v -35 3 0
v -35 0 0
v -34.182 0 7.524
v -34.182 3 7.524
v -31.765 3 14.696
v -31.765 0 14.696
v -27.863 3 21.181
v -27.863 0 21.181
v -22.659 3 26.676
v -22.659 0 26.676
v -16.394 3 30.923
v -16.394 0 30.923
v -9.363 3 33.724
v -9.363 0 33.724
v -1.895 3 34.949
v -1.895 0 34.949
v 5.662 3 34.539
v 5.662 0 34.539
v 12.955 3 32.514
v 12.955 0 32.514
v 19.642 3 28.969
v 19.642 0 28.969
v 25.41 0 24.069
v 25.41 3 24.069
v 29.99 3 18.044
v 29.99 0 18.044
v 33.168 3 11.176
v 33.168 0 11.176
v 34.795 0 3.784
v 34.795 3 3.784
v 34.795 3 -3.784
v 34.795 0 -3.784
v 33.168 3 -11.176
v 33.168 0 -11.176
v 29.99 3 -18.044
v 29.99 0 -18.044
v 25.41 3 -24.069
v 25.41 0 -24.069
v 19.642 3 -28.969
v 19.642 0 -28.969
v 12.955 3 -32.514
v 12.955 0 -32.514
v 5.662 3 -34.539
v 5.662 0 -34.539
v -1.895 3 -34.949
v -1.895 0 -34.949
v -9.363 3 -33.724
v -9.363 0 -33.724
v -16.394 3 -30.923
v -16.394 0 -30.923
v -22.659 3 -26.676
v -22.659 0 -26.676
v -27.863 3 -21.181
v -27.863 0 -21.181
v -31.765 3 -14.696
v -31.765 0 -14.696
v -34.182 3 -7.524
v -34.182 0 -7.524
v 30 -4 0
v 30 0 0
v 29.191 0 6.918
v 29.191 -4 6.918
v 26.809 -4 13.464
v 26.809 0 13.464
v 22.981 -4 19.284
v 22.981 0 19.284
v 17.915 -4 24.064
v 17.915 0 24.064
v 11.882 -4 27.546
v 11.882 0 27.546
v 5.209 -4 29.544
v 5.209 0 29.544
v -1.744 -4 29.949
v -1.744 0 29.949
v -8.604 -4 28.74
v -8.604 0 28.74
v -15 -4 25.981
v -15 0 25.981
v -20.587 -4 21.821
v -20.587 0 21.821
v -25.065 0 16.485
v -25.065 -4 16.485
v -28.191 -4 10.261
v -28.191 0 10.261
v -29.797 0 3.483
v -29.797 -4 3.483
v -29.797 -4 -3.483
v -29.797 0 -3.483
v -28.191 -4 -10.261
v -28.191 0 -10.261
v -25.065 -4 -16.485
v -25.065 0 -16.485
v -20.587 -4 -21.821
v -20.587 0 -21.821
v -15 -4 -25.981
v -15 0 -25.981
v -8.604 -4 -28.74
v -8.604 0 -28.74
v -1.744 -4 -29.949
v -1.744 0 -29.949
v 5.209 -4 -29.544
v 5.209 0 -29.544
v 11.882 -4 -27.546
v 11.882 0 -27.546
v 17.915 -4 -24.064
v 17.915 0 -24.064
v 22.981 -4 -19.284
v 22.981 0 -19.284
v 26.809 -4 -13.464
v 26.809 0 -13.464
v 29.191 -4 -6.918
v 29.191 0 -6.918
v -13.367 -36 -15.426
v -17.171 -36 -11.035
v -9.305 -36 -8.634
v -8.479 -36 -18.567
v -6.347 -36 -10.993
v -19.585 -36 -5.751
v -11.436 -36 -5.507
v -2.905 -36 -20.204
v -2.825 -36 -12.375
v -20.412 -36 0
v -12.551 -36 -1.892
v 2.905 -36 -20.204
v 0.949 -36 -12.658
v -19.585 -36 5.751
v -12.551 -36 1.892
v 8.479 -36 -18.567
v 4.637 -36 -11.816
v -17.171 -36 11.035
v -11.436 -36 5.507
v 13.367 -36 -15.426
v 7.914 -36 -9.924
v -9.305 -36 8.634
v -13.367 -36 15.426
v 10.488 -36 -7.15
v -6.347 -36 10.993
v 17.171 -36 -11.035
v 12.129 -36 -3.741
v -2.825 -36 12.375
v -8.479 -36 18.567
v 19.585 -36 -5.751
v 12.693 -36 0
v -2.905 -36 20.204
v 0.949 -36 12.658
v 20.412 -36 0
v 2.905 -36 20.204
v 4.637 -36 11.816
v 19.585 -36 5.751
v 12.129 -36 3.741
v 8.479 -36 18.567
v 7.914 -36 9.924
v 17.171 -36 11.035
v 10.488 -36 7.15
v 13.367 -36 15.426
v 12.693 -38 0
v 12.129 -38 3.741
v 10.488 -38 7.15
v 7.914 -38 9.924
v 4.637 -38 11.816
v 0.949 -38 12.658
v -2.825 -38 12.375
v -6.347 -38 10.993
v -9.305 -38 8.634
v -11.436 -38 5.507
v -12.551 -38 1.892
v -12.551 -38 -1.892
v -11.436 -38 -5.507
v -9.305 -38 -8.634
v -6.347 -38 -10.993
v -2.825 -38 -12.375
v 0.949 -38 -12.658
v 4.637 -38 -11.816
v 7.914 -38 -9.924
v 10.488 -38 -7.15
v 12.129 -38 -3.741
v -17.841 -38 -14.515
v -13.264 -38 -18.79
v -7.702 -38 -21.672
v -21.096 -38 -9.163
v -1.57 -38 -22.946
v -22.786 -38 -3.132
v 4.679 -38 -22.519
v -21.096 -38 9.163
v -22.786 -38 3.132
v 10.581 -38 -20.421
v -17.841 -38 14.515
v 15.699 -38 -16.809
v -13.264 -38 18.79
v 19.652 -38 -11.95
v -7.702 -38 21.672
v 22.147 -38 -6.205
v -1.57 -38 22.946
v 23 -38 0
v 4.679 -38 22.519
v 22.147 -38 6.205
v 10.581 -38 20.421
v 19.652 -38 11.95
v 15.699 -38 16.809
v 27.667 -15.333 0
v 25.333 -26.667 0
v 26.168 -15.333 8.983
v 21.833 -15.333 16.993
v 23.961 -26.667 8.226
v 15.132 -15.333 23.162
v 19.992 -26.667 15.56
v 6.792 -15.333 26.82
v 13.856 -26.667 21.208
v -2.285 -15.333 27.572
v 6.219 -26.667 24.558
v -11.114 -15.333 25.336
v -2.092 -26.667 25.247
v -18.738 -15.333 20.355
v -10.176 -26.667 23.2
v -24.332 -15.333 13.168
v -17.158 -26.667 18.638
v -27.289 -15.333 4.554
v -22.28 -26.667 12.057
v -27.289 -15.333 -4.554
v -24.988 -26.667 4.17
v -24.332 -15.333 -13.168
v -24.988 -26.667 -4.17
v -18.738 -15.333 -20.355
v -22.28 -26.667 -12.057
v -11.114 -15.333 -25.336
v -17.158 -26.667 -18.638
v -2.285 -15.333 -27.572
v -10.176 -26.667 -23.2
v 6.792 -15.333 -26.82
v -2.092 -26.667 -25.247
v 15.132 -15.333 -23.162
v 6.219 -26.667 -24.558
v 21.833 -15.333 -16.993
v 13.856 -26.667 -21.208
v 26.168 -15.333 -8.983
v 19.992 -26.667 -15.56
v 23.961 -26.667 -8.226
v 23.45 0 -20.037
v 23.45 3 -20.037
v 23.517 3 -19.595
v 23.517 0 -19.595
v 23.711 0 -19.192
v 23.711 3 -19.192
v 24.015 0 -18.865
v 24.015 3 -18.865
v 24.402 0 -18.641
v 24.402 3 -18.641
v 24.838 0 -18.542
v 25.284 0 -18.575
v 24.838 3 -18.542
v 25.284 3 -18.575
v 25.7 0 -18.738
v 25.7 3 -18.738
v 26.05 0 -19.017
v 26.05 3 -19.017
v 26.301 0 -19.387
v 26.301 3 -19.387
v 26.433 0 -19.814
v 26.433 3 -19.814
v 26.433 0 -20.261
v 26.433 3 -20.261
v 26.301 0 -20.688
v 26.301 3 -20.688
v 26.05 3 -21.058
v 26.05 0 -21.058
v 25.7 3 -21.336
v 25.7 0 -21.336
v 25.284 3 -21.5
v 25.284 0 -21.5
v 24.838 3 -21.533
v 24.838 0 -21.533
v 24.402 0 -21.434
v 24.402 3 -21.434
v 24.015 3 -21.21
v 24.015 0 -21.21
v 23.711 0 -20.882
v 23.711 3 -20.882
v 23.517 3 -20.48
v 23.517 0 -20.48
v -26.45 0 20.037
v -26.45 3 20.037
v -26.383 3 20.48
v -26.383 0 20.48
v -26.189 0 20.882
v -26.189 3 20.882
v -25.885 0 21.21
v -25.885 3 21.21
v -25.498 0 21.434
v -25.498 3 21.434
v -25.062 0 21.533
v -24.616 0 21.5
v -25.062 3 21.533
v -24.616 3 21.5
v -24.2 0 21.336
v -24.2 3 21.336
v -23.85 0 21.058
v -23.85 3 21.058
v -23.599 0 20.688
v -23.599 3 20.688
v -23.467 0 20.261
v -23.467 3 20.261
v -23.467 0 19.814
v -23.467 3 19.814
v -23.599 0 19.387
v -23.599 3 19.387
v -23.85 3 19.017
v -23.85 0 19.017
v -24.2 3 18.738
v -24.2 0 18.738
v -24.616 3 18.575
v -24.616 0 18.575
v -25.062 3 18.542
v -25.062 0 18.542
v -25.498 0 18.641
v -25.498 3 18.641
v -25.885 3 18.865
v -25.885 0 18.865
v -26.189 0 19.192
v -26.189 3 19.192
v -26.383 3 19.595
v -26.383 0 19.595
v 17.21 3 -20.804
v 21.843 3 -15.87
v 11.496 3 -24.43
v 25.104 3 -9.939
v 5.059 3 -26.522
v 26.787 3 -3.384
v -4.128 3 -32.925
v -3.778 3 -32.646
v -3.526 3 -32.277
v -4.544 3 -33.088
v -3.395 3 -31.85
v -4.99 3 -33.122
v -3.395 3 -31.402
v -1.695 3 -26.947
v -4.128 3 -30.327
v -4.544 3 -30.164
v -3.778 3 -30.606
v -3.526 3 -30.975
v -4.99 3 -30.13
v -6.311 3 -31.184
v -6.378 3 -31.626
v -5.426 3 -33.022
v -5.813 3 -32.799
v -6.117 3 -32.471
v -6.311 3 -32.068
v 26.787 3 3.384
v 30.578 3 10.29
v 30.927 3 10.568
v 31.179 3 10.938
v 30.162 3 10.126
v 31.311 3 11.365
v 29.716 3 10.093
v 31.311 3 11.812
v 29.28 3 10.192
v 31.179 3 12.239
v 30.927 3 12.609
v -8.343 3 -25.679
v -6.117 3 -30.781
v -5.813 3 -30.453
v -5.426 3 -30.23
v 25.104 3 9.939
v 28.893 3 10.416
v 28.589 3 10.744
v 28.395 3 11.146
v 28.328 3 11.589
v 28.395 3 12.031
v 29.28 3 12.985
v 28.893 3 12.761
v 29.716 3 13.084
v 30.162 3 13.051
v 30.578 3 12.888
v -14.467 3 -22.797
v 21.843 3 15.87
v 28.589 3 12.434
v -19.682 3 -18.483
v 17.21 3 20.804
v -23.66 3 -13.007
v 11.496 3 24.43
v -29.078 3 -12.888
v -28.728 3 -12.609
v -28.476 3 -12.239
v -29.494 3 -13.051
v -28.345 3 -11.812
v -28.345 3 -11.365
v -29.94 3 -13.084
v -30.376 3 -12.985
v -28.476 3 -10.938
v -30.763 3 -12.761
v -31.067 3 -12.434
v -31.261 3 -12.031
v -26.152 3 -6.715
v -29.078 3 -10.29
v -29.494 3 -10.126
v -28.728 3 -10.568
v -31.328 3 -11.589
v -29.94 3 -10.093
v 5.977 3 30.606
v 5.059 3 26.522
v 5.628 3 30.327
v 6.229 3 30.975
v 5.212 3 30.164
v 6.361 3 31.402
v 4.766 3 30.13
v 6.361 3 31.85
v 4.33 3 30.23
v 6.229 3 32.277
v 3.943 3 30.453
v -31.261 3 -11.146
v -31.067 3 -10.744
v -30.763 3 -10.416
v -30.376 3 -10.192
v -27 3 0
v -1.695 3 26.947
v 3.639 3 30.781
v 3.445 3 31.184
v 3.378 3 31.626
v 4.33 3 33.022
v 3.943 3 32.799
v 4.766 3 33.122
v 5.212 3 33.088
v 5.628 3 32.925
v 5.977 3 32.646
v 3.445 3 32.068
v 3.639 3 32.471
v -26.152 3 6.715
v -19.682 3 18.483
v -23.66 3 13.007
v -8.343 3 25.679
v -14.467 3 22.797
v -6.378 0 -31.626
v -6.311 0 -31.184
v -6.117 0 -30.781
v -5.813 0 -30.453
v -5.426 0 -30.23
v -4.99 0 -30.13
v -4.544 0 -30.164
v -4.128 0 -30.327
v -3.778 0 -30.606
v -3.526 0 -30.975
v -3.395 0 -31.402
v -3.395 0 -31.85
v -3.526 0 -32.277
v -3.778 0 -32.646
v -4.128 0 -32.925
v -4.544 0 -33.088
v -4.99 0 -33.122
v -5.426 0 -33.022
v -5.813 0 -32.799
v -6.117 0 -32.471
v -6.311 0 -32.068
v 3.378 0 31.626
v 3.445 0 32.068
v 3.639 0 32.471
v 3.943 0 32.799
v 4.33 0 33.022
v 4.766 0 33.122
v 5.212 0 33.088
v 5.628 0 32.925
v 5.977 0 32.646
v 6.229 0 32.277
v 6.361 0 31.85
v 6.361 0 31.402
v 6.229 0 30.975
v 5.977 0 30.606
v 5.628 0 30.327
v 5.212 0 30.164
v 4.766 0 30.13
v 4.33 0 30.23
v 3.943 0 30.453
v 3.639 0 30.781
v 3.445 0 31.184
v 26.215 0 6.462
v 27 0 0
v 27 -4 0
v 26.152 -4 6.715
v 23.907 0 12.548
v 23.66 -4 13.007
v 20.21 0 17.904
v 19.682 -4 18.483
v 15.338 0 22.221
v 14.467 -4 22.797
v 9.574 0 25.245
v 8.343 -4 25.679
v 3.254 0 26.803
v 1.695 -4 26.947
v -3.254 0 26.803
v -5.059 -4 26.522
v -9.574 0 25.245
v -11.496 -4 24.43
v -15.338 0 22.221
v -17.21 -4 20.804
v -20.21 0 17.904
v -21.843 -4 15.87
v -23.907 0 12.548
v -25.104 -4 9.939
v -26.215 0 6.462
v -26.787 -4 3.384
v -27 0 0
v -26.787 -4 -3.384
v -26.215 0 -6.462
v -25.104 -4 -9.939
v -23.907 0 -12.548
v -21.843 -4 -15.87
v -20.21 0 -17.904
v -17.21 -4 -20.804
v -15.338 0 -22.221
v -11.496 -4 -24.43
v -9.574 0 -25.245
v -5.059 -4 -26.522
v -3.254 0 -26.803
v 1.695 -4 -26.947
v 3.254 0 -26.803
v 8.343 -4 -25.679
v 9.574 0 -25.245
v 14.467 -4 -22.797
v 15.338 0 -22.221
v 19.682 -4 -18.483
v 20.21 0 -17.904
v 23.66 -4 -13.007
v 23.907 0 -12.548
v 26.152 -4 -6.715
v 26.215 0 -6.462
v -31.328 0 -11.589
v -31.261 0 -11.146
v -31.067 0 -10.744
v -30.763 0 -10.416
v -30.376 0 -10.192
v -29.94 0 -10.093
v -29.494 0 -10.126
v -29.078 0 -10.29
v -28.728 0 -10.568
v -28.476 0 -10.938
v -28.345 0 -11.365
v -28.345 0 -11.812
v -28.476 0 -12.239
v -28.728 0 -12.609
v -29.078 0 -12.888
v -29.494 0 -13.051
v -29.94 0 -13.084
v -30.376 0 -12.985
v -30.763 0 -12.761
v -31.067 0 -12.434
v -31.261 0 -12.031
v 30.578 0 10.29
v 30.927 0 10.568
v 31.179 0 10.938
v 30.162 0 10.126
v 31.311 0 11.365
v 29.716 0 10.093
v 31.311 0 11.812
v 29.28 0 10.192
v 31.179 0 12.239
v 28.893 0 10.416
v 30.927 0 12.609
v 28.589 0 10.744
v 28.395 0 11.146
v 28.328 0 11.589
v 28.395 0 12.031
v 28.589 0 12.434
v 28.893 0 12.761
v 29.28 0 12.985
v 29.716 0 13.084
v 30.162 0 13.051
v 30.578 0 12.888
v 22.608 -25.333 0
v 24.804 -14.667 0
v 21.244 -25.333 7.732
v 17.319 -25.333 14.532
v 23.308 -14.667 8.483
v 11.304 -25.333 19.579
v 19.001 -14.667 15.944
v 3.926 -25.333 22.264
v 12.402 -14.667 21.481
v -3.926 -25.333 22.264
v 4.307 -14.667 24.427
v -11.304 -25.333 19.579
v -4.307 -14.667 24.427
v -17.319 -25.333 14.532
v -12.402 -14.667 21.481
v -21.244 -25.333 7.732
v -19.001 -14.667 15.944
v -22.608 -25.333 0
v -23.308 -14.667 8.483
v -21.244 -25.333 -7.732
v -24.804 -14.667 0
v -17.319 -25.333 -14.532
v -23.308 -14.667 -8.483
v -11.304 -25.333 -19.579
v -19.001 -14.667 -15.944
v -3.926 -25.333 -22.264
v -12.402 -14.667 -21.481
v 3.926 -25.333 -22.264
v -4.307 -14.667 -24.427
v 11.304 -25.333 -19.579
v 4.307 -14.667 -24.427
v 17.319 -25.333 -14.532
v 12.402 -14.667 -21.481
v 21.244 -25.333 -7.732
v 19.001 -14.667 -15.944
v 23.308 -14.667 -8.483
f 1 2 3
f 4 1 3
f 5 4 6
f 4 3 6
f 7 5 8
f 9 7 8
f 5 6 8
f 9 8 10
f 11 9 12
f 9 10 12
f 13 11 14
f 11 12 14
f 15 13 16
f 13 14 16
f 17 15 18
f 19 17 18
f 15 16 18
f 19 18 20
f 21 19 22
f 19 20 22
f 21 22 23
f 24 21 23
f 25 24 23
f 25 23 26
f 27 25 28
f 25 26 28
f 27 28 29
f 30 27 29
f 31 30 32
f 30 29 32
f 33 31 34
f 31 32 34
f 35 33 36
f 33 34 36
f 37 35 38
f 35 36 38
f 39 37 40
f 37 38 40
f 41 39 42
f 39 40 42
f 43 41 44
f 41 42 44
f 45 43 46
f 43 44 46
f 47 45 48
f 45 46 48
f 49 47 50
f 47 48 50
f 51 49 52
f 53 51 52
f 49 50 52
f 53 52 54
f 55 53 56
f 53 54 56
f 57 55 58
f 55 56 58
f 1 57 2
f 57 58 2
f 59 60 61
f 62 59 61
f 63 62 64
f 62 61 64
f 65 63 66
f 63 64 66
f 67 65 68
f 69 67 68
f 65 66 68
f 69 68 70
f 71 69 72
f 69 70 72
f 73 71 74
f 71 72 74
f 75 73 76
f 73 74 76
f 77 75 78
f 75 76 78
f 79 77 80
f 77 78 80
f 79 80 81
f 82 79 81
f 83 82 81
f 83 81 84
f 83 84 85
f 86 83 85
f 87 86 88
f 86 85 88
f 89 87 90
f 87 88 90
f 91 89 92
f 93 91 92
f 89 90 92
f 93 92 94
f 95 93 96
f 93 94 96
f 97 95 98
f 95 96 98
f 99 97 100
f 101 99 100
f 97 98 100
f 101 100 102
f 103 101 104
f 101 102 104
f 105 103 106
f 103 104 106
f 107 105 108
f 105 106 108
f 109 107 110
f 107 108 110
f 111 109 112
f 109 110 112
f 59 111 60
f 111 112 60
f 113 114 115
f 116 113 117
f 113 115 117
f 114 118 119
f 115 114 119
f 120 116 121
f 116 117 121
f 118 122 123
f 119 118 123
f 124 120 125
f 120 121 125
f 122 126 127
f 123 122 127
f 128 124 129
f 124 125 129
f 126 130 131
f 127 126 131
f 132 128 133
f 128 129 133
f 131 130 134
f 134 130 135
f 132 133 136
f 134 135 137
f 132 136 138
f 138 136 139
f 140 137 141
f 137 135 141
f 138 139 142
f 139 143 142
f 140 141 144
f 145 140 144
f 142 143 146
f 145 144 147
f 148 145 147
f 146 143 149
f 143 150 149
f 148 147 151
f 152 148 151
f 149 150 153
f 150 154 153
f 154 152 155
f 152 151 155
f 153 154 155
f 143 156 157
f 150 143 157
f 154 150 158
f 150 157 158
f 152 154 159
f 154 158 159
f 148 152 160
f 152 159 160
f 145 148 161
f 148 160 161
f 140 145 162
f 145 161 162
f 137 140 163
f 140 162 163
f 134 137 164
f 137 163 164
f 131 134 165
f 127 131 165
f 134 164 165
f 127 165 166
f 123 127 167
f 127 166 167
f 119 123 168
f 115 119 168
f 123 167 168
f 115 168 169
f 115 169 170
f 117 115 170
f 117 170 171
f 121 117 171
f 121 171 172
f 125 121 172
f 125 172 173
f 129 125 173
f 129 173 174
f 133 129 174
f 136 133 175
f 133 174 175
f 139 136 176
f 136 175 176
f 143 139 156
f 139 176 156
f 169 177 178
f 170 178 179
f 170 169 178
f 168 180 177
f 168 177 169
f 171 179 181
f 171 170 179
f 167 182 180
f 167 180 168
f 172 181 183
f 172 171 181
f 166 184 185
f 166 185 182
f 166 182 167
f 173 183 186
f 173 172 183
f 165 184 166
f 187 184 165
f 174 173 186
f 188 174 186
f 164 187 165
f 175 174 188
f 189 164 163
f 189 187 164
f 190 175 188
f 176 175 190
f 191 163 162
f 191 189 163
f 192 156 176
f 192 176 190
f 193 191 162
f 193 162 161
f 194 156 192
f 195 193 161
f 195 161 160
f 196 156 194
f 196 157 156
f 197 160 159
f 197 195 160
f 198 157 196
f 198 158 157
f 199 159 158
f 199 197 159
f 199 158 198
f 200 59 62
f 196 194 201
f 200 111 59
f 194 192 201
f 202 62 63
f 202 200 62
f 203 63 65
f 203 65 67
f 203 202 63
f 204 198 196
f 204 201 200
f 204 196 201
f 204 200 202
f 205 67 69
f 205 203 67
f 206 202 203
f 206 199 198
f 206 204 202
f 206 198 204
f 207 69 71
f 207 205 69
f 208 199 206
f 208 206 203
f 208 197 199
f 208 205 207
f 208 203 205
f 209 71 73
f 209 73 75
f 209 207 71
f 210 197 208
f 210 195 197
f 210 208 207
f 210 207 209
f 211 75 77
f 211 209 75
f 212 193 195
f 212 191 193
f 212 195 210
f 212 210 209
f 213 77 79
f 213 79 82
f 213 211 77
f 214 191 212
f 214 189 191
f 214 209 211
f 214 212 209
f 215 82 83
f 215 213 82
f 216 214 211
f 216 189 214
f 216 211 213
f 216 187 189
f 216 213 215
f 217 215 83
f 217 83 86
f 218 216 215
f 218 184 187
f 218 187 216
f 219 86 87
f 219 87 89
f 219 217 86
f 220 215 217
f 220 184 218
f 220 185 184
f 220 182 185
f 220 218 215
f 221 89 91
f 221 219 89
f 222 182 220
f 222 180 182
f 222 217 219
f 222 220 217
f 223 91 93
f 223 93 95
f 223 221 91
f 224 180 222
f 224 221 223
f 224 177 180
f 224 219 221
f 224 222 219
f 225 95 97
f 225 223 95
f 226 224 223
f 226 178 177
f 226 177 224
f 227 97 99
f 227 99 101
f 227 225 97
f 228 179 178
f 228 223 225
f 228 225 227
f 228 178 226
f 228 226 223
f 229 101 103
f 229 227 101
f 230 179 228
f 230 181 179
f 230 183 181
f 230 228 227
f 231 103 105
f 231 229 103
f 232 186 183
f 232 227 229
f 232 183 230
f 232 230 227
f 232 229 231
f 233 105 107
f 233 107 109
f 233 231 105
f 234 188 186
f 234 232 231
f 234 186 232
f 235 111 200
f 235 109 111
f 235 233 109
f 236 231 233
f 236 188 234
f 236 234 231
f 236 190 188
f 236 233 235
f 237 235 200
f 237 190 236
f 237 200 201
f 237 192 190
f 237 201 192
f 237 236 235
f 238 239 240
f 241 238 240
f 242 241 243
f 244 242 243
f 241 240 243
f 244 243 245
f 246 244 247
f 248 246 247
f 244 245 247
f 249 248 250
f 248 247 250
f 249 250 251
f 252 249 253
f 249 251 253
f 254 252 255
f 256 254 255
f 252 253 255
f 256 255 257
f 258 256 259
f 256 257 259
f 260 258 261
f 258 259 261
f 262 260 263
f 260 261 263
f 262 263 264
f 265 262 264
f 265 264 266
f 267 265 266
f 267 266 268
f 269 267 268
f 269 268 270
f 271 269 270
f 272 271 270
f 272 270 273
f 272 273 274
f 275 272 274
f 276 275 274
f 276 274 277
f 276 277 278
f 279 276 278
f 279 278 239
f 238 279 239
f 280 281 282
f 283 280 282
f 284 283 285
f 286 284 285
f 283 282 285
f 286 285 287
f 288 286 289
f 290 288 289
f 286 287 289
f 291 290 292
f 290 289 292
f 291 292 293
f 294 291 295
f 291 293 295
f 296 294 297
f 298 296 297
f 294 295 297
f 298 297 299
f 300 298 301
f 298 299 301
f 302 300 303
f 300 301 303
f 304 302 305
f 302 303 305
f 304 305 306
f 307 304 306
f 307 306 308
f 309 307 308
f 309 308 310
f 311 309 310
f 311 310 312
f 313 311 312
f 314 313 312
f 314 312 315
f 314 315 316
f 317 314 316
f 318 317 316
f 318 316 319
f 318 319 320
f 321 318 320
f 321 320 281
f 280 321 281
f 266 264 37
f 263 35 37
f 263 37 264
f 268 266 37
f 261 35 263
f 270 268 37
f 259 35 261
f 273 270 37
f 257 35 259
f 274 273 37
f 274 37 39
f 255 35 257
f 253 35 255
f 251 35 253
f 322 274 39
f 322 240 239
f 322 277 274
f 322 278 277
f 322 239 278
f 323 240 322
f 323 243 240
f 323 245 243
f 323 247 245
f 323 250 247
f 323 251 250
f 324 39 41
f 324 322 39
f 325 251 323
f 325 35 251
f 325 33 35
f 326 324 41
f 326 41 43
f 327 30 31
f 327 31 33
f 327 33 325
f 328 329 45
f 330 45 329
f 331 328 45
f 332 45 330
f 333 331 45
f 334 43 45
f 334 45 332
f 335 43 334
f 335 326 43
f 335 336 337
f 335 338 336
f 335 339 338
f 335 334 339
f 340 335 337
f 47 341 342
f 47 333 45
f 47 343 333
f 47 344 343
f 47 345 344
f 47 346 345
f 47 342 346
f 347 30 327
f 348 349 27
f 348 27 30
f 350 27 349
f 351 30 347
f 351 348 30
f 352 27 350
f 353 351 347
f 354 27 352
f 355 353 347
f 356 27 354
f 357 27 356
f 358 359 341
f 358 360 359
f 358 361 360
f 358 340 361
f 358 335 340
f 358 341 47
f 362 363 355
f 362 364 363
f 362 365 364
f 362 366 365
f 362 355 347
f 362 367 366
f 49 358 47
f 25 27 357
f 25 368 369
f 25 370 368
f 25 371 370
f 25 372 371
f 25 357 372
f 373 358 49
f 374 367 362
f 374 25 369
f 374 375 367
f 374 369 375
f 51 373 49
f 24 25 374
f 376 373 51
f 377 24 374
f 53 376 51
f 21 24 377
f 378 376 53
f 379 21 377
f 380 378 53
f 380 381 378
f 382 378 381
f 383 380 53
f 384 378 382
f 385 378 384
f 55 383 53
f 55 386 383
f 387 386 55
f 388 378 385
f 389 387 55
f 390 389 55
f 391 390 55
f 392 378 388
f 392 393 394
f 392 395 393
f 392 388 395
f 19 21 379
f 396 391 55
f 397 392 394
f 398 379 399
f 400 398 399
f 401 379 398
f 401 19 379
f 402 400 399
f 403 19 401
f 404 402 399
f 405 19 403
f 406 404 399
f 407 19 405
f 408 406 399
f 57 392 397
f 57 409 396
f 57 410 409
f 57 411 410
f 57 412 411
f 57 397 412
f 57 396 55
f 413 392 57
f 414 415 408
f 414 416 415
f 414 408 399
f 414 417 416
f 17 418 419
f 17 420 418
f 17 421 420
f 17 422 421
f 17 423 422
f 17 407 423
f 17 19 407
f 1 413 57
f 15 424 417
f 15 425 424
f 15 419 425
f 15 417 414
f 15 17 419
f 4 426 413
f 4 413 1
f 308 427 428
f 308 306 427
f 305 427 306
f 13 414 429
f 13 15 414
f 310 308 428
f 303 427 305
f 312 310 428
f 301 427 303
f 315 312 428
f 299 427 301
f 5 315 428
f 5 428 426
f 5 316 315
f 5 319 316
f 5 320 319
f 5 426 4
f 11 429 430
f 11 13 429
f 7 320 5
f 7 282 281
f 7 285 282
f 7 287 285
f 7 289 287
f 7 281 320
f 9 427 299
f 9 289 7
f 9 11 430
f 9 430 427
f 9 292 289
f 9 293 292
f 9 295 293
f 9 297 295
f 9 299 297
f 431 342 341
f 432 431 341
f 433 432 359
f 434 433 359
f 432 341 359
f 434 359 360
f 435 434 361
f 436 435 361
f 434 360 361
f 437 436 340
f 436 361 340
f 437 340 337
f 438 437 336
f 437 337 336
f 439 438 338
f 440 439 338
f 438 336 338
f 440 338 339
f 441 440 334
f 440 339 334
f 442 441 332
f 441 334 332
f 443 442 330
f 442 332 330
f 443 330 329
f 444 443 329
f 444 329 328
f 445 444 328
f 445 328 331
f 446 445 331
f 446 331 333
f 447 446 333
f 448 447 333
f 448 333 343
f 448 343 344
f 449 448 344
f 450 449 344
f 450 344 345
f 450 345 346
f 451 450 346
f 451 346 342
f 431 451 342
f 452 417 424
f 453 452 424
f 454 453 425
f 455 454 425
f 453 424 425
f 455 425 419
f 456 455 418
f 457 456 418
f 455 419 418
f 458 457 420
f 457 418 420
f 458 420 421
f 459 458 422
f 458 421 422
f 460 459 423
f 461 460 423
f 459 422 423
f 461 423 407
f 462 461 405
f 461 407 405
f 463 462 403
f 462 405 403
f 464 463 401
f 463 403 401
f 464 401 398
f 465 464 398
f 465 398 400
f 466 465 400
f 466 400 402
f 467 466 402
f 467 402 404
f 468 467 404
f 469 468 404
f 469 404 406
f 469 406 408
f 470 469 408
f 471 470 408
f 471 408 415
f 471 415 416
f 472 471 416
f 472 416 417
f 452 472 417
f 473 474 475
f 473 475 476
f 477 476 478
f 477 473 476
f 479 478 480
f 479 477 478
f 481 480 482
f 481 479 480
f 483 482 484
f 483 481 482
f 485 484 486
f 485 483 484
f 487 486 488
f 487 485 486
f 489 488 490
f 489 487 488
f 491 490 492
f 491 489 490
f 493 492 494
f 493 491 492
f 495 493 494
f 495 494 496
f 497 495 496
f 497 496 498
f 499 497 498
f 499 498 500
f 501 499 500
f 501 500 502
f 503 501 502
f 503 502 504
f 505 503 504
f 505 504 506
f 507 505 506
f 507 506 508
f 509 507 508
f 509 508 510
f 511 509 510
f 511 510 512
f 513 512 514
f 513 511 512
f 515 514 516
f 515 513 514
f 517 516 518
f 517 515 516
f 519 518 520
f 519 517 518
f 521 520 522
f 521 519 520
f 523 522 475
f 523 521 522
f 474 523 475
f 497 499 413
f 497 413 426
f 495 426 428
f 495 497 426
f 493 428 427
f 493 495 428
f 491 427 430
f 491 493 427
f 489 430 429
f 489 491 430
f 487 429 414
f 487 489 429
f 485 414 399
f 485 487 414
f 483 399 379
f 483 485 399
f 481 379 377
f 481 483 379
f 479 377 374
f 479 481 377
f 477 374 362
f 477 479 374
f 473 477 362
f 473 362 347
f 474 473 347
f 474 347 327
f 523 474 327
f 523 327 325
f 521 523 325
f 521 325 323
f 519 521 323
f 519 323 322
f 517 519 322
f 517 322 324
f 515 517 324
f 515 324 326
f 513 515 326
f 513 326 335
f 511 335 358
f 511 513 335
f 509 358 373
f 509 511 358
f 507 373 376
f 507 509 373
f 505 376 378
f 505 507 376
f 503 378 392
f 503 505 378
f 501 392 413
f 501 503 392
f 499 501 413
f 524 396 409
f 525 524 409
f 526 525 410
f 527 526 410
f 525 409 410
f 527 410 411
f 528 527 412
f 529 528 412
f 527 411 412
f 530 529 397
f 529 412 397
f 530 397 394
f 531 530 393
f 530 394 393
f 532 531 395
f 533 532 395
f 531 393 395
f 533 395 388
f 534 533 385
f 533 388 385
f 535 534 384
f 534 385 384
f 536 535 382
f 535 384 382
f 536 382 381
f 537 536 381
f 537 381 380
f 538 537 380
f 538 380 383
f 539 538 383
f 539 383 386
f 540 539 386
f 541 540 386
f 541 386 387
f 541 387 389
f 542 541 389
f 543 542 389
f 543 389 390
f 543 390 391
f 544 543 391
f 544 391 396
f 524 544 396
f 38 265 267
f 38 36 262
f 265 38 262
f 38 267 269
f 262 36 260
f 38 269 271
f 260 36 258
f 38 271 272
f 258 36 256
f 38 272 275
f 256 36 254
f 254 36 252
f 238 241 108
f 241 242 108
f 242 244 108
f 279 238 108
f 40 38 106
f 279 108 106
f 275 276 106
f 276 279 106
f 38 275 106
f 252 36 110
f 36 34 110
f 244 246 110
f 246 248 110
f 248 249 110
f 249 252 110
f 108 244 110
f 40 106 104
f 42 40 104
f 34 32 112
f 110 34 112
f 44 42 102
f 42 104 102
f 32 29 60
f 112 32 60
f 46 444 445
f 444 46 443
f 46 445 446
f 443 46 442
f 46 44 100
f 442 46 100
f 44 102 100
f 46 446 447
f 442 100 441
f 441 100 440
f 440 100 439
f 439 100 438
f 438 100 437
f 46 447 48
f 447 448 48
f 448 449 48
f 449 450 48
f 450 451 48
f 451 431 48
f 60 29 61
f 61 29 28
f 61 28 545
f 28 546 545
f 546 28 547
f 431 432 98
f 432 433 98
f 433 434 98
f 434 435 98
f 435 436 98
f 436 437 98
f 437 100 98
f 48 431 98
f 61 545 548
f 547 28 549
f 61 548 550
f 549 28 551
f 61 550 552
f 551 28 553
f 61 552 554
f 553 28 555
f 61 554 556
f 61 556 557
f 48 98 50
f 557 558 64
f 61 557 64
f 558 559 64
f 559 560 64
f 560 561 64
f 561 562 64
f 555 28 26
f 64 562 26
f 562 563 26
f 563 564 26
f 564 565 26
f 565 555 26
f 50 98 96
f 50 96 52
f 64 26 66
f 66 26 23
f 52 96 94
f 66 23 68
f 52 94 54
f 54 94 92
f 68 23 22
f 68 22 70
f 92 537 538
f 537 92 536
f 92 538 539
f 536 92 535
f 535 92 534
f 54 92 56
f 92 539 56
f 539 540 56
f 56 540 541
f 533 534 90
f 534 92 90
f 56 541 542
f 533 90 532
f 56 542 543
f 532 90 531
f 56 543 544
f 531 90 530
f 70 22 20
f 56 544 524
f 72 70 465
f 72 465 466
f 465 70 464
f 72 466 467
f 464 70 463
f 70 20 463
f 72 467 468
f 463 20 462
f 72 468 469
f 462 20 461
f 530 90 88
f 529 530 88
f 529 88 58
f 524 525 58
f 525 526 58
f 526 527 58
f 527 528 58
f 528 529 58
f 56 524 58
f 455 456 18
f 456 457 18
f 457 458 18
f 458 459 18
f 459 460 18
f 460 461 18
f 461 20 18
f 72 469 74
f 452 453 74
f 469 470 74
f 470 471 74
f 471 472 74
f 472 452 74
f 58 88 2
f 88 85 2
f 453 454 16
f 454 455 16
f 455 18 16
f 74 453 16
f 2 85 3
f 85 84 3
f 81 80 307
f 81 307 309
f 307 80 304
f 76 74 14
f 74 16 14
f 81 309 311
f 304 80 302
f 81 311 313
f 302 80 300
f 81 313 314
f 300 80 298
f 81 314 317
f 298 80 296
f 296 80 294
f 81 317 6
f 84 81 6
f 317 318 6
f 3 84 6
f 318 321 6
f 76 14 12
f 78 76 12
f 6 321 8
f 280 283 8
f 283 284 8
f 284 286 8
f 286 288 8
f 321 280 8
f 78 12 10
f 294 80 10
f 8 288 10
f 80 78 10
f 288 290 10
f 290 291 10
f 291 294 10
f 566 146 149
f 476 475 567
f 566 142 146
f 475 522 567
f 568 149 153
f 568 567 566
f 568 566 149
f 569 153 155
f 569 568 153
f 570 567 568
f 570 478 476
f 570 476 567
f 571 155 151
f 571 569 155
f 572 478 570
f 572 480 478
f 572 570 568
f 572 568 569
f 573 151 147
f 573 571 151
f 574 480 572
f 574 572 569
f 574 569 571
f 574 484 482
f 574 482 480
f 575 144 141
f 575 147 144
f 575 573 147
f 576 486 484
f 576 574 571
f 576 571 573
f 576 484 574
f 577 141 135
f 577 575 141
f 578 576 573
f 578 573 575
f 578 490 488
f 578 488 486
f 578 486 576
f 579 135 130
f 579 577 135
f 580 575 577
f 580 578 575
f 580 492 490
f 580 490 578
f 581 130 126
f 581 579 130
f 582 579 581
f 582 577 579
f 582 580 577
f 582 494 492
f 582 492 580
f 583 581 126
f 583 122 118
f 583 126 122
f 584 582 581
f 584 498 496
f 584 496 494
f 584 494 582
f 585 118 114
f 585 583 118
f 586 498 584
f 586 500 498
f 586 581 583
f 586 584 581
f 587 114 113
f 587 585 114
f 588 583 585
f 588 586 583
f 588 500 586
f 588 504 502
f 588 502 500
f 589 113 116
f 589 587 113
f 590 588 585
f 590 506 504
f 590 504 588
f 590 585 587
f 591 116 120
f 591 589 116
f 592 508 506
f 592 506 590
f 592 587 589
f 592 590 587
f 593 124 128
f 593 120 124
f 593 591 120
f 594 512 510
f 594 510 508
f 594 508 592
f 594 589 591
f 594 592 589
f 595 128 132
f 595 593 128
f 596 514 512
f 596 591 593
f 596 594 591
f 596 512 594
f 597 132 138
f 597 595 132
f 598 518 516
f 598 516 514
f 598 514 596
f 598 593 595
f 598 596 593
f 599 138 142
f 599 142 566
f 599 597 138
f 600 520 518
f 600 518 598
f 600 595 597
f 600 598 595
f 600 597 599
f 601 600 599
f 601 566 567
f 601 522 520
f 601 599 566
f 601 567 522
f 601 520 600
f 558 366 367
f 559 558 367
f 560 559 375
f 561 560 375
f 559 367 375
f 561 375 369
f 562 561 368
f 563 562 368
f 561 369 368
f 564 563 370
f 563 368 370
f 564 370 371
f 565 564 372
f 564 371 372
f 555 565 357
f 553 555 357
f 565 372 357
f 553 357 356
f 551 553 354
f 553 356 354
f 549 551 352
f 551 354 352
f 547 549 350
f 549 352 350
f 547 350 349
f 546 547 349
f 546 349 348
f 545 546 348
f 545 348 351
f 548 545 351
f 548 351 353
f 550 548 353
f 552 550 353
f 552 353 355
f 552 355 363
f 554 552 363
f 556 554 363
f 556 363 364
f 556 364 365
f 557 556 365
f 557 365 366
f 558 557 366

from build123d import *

# Parameters (mm, degrees)
F0_R      = 30
F0_R_2    = 27
F1_DEPTH  = 4
F4_R      = 30
F3_R      = 23
F7_R      = 20
F6_R      = 27
F9_R      = 22.403667
F9_R_2    = 12.693191
F10_DEPTH = 2
F11_R     = 35
F11_R_2   = 27
F12_DEPTH = 3
F13_R     = 1.5
F14_DEPTH = 25


with BuildPart() as f1:
    # F0 (on Front) → F1 (new body)
    with BuildSketch(Plane.XZ):
        Circle(F0_R)
        Circle(F0_R_2, mode=Mode.SUBTRACT)
    extrude(amount=F1_DEPTH)

    # F4 (on face) → F5 section 0
    with BuildSketch(Plane.XZ.offset(4)):
        Circle(F4_R)
    # F3 (on offset) → F5 section 1
    with BuildSketch(Plane.XZ.offset(38)):
        Circle(F3_R)
    loft()

    # F7 (on face) → F8 section 0
    with BuildSketch(Plane.XZ.offset(38)):
        Circle(F7_R)
    # F6 (on face) → F8 section 1
    with BuildSketch(Plane(origin=(0, -4, 0), x_dir=(-1, 0, 0), z_dir=(0, 1, 0))):
        Circle(F6_R)
    loft(mode=Mode.SUBTRACT)

    # F9 (on face) → F10 (join)
    with BuildSketch(Plane.XZ.offset(38)):
        Circle(F9_R)
        Circle(F9_R_2, mode=Mode.SUBTRACT)
    extrude(amount=-F10_DEPTH)

    # F11 (on face) → F12 (join)
    with BuildSketch(Plane(origin=(0, 0, 0), x_dir=(-1, 0, 0), z_dir=(0, 1, 0))):
        Circle(F11_R)
        Circle(F11_R_2, mode=Mode.SUBTRACT)
    extrude(amount=F12_DEPTH)

    # F13 (on face) → F14 (cut)
    with BuildSketch(Plane(origin=(0, 3, 0), x_dir=(-1, 0, 0), z_dir=(0, 1, 0))):
        with Locations((-4.877913, 31.626033)):
            Circle(F13_R)
        with Locations((24.949992, 20.037413)):
            Circle(F13_R)
        with Locations((29.827904, -11.58862)):
            Circle(F13_R)
        with Locations((4.877913, -31.626033)):
            Circle(F13_R)
        with Locations((-24.949992, -20.037413)):
            Circle(F13_R)
        with Locations((-29.827904, 11.58862)):
            Circle(F13_R)
    extrude(amount=-F14_DEPTH, mode=Mode.SUBTRACT)


solid = f1.part
